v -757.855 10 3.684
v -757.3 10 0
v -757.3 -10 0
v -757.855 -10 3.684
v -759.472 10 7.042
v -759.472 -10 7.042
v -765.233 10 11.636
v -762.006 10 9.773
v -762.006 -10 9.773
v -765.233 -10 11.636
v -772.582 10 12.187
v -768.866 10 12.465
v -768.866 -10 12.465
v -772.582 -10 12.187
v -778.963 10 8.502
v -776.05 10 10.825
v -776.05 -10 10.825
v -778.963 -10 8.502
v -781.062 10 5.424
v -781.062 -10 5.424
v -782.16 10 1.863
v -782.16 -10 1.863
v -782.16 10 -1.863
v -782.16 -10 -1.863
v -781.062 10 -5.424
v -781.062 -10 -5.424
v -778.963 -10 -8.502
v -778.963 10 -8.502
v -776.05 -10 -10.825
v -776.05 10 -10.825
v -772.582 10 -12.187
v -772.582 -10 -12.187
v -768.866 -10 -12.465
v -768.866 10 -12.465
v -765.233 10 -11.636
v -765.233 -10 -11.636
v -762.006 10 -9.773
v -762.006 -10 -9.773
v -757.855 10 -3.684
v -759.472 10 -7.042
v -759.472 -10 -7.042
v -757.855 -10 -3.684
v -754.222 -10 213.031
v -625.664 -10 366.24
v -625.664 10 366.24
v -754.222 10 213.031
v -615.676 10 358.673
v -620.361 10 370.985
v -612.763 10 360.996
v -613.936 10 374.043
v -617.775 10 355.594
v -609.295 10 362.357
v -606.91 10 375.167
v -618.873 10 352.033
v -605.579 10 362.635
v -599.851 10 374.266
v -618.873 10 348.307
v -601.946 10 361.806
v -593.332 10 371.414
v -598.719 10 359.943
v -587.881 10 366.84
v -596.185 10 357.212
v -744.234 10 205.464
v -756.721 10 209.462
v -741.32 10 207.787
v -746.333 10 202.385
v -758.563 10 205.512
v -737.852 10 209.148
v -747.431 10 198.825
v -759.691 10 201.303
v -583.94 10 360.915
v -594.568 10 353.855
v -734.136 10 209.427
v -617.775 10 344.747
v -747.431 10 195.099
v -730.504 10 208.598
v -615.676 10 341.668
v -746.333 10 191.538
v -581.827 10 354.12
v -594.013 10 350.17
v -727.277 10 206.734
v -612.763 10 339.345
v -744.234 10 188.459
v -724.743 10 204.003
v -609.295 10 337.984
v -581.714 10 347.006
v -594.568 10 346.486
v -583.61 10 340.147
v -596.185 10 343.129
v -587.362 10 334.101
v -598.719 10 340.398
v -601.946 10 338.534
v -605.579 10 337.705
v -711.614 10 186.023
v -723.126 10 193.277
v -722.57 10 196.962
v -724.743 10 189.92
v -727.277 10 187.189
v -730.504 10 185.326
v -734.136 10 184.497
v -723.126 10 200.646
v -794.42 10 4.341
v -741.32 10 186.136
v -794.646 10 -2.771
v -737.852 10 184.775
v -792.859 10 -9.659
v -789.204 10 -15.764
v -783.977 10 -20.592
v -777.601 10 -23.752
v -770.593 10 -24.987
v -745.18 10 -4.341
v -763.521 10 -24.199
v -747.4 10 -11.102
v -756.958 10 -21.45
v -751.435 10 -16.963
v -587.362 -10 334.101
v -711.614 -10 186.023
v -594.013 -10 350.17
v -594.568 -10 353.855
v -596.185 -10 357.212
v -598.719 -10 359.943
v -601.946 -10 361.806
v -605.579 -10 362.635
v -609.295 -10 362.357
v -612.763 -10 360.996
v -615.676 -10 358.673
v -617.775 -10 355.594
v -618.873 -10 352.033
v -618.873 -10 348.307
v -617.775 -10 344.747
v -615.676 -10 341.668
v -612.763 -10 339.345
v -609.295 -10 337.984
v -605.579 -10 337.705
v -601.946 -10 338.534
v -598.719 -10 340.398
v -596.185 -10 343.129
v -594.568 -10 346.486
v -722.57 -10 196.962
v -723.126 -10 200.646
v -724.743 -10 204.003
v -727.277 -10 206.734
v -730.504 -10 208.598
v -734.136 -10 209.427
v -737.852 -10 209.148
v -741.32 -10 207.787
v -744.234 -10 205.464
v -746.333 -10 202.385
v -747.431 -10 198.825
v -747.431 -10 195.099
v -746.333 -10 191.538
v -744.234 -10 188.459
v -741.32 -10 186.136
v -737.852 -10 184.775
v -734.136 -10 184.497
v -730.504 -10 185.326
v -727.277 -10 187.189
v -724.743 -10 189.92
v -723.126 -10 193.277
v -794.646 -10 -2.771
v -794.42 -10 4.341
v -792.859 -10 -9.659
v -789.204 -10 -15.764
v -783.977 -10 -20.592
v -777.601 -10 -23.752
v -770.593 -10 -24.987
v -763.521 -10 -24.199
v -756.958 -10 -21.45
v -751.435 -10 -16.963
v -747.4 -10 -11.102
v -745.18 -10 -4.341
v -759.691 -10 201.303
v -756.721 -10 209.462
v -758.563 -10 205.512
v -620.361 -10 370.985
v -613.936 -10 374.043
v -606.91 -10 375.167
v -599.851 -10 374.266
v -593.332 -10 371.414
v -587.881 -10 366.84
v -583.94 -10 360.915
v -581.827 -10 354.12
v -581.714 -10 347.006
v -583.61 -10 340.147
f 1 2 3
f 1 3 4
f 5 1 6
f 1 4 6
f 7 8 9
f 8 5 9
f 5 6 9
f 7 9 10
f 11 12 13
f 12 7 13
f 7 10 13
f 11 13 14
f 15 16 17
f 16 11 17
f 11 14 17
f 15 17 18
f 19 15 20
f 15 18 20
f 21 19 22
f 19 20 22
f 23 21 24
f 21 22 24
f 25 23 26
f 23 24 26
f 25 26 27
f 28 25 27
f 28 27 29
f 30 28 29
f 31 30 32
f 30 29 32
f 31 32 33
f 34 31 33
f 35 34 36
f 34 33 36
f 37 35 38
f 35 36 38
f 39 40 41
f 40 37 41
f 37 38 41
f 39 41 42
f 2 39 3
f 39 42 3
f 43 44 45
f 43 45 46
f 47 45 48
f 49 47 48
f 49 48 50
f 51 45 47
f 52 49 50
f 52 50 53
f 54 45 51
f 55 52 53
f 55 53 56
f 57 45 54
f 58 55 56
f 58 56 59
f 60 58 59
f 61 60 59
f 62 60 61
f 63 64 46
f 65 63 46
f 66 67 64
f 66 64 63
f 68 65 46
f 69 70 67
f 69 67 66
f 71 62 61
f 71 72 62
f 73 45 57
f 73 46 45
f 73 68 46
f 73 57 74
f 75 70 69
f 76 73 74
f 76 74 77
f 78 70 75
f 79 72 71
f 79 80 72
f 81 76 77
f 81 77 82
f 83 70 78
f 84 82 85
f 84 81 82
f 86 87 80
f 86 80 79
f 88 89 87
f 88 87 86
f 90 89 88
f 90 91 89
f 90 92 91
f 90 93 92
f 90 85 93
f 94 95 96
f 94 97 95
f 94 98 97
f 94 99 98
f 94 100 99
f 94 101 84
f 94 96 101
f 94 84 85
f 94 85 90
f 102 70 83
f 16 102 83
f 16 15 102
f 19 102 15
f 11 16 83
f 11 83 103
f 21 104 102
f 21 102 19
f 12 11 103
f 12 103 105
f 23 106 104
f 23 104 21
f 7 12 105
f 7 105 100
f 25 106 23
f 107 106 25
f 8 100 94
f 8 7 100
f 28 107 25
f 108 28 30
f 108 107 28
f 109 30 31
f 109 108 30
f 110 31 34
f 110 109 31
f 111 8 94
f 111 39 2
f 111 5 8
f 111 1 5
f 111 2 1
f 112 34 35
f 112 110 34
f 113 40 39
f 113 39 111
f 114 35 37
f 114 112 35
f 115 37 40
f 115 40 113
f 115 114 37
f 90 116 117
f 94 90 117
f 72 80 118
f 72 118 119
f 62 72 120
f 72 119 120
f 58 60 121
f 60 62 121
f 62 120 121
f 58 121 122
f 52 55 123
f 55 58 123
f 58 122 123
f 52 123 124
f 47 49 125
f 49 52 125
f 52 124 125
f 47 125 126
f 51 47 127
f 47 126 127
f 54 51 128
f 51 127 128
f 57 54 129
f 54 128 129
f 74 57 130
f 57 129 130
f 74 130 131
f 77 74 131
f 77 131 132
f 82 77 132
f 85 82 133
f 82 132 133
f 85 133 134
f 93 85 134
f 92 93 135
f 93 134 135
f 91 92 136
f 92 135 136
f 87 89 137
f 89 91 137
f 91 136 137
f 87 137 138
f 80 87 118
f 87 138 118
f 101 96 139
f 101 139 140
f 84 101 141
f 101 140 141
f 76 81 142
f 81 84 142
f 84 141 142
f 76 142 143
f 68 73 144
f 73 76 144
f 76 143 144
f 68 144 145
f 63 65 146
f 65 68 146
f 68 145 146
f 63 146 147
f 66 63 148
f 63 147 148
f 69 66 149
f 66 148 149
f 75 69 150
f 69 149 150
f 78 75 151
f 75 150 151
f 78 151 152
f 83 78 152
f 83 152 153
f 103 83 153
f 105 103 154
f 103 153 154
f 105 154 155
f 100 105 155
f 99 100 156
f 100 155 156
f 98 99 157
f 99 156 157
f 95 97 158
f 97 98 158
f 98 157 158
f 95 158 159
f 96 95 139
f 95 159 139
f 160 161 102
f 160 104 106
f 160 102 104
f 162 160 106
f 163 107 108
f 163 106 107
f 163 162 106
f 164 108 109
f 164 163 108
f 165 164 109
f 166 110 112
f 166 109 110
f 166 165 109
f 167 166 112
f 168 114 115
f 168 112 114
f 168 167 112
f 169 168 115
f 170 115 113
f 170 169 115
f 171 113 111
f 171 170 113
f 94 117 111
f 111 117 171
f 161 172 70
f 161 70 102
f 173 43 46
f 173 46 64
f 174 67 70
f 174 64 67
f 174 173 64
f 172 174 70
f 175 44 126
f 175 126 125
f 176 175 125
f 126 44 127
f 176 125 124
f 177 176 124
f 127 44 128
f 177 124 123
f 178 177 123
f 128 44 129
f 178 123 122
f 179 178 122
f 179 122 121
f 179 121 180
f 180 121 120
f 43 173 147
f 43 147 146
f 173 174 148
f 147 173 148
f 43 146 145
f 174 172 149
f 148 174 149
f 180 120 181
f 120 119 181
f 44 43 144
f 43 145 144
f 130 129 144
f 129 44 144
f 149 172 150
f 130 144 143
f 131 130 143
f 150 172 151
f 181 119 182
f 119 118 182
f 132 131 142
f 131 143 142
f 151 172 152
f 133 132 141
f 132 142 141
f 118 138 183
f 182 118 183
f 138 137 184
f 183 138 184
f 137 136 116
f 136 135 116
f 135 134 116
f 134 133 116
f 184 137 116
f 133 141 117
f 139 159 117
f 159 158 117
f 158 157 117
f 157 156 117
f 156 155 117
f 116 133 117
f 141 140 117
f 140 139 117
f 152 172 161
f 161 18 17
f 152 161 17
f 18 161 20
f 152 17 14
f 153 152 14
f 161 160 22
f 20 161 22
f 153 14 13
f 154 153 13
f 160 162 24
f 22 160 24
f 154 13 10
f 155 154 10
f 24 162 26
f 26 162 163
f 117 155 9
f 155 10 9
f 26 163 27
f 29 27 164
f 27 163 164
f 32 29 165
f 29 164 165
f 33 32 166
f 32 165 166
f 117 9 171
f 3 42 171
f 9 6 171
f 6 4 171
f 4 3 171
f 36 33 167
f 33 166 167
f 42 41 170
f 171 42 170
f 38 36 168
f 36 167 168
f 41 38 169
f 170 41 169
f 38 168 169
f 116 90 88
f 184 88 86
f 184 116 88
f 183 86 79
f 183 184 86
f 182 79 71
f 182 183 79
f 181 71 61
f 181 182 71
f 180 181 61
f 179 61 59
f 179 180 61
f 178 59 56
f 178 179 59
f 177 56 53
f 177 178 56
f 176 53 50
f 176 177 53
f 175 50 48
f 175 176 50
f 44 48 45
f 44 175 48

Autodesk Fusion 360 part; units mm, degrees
sketch "Sketch1" plane through (0, 0, 0) normal (0, 1, 0) x (1, 0, 0)
  line L0 (0, 0) -> (-735.0705, 0) construction
  line L1 (0, 0) -> (-636.5897, -367.5353) construction
  line L2 (0, 0) -> (-735.0705, -196.9616) construction
  circle A0 centre (-735.0705, -196.9616) radius 25
  circle A1 centre (-735.0705, -196.9616) radius 12.5
  circle A2 centre (-700.3409, 0) radius 25
  circle A3 centre (-700.3409, 0) radius 12.5
  circle A4 centre (-666.6665, -384.9001) radius 25
  circle A5 centre (-666.6665, -384.9001) radius 12.5
  line L3 (-675.7207, -4.3412) -> (-710.4503, -201.3028)
  line L4 (-759.6907, -192.6203) -> (-724.9611, 4.3412)
  line L5 (-643.1742, -376.3496) -> (-711.5782, -188.411)
  line L6 (-690.1588, -393.4506) -> (-758.5628, -205.5121)
  line L7 (-666.6665, -384.9001) -> (-735.0705, -196.9616) construction
  line L8 (-735.0705, -196.9616) -> (-700.3409, 0) construction
  line L9 (-735.0705, -196.9616) -> (-735.0705, 0) construction
  line L10 (-735.0705, -196.9616) -> (-636.5897, -367.5353) construction
  dimension "d2" = 30
  dimension "d3" = 15
  dimension "d6" = 50
  dimension "d7" = 25
  dimension "d8" = 50
  dimension "d9" = 25
  dimension "d10" = 50
  dimension "d11" = 25
  dimension "d15" = 10
  dimension "d16" = 10
  dimension "d17" = 200
extrude "Extrude1" add sketch "Sketch1" along normal mid plane 20
equation "d3 = d2 / 2"
equation "d7 = d6 / 2"
equation "d8 = d6"
equation "d9 = d7"
equation "d10 = d6"
equation "d11 = d7"
equation "d16 = d15"

Autodesk Fusion 360 part; units mm, degrees
sketch "Sketch1" plane through (0, 0, 0) normal (0, 1, 0) x (1, 0, 0)
  line L0 (0, 0) -> (-735.0705, 0) construction
  line L1 (0, 0) -> (-636.5897, -367.5353) construction
  line L2 (0, 0) -> (-735.0705, -196.9616) construction
  circle A0 centre (-769.8001, 0) radius 25
  circle A1 centre (-606.513, -350.1704) radius 25
  circle A2 centre (-735.0705, -196.9616) radius 12.5
  circle A3 centre (-735.0705, -196.9616) radius 25
  line L3 (-759.6907, -201.3028) -> (-794.4203, -4.3412)
  line L4 (-710.4503, -192.6203) -> (-745.18, 4.3412)
  line L5 (-587.3619, -334.1007) -> (-715.9194, -180.8919)
  line L6 (-625.6641, -366.2401) -> (-754.2216, -213.0312)
  circle A4 centre (-769.8001, 0) radius 12.5
  circle A5 centre (-606.513, -350.1704) radius 12.5
  line L7 (-735.0705, 0) -> (-735.0705, -196.9616) construction
  line L8 (-636.5897, -367.5353) -> (-735.0705, -196.9616) construction
  line L9 (-735.0705, -196.9616) -> (-769.8001, 0) construction
  line L10 (-735.0705, -196.9616) -> (-606.513, -350.1704) construction
  dimension "d2" = 30
  dimension "d3" = 15
  dimension "d7" = 50
  dimension "d8" = 50
  dimension "d9" = 25
  dimension "d10" = 50
  dimension "d11" = 25
  dimension "d12" = 25
  dimension "d18" = 10
  dimension "d19" = 10
  dimension "d20" = 200
extrude "Extrude1" add sketch "Sketch1" along normal mid plane 20
equation "d2 = ( 90 / 3 ) * 1 deg"
equation "d3 = d2 / 2"
equation "d8 = d7"
equation "d9 = d7 / 2"
equation "d10 = d7"
equation "d11 = d9"
equation "d12 = d9"
equation "d19 = d18"
